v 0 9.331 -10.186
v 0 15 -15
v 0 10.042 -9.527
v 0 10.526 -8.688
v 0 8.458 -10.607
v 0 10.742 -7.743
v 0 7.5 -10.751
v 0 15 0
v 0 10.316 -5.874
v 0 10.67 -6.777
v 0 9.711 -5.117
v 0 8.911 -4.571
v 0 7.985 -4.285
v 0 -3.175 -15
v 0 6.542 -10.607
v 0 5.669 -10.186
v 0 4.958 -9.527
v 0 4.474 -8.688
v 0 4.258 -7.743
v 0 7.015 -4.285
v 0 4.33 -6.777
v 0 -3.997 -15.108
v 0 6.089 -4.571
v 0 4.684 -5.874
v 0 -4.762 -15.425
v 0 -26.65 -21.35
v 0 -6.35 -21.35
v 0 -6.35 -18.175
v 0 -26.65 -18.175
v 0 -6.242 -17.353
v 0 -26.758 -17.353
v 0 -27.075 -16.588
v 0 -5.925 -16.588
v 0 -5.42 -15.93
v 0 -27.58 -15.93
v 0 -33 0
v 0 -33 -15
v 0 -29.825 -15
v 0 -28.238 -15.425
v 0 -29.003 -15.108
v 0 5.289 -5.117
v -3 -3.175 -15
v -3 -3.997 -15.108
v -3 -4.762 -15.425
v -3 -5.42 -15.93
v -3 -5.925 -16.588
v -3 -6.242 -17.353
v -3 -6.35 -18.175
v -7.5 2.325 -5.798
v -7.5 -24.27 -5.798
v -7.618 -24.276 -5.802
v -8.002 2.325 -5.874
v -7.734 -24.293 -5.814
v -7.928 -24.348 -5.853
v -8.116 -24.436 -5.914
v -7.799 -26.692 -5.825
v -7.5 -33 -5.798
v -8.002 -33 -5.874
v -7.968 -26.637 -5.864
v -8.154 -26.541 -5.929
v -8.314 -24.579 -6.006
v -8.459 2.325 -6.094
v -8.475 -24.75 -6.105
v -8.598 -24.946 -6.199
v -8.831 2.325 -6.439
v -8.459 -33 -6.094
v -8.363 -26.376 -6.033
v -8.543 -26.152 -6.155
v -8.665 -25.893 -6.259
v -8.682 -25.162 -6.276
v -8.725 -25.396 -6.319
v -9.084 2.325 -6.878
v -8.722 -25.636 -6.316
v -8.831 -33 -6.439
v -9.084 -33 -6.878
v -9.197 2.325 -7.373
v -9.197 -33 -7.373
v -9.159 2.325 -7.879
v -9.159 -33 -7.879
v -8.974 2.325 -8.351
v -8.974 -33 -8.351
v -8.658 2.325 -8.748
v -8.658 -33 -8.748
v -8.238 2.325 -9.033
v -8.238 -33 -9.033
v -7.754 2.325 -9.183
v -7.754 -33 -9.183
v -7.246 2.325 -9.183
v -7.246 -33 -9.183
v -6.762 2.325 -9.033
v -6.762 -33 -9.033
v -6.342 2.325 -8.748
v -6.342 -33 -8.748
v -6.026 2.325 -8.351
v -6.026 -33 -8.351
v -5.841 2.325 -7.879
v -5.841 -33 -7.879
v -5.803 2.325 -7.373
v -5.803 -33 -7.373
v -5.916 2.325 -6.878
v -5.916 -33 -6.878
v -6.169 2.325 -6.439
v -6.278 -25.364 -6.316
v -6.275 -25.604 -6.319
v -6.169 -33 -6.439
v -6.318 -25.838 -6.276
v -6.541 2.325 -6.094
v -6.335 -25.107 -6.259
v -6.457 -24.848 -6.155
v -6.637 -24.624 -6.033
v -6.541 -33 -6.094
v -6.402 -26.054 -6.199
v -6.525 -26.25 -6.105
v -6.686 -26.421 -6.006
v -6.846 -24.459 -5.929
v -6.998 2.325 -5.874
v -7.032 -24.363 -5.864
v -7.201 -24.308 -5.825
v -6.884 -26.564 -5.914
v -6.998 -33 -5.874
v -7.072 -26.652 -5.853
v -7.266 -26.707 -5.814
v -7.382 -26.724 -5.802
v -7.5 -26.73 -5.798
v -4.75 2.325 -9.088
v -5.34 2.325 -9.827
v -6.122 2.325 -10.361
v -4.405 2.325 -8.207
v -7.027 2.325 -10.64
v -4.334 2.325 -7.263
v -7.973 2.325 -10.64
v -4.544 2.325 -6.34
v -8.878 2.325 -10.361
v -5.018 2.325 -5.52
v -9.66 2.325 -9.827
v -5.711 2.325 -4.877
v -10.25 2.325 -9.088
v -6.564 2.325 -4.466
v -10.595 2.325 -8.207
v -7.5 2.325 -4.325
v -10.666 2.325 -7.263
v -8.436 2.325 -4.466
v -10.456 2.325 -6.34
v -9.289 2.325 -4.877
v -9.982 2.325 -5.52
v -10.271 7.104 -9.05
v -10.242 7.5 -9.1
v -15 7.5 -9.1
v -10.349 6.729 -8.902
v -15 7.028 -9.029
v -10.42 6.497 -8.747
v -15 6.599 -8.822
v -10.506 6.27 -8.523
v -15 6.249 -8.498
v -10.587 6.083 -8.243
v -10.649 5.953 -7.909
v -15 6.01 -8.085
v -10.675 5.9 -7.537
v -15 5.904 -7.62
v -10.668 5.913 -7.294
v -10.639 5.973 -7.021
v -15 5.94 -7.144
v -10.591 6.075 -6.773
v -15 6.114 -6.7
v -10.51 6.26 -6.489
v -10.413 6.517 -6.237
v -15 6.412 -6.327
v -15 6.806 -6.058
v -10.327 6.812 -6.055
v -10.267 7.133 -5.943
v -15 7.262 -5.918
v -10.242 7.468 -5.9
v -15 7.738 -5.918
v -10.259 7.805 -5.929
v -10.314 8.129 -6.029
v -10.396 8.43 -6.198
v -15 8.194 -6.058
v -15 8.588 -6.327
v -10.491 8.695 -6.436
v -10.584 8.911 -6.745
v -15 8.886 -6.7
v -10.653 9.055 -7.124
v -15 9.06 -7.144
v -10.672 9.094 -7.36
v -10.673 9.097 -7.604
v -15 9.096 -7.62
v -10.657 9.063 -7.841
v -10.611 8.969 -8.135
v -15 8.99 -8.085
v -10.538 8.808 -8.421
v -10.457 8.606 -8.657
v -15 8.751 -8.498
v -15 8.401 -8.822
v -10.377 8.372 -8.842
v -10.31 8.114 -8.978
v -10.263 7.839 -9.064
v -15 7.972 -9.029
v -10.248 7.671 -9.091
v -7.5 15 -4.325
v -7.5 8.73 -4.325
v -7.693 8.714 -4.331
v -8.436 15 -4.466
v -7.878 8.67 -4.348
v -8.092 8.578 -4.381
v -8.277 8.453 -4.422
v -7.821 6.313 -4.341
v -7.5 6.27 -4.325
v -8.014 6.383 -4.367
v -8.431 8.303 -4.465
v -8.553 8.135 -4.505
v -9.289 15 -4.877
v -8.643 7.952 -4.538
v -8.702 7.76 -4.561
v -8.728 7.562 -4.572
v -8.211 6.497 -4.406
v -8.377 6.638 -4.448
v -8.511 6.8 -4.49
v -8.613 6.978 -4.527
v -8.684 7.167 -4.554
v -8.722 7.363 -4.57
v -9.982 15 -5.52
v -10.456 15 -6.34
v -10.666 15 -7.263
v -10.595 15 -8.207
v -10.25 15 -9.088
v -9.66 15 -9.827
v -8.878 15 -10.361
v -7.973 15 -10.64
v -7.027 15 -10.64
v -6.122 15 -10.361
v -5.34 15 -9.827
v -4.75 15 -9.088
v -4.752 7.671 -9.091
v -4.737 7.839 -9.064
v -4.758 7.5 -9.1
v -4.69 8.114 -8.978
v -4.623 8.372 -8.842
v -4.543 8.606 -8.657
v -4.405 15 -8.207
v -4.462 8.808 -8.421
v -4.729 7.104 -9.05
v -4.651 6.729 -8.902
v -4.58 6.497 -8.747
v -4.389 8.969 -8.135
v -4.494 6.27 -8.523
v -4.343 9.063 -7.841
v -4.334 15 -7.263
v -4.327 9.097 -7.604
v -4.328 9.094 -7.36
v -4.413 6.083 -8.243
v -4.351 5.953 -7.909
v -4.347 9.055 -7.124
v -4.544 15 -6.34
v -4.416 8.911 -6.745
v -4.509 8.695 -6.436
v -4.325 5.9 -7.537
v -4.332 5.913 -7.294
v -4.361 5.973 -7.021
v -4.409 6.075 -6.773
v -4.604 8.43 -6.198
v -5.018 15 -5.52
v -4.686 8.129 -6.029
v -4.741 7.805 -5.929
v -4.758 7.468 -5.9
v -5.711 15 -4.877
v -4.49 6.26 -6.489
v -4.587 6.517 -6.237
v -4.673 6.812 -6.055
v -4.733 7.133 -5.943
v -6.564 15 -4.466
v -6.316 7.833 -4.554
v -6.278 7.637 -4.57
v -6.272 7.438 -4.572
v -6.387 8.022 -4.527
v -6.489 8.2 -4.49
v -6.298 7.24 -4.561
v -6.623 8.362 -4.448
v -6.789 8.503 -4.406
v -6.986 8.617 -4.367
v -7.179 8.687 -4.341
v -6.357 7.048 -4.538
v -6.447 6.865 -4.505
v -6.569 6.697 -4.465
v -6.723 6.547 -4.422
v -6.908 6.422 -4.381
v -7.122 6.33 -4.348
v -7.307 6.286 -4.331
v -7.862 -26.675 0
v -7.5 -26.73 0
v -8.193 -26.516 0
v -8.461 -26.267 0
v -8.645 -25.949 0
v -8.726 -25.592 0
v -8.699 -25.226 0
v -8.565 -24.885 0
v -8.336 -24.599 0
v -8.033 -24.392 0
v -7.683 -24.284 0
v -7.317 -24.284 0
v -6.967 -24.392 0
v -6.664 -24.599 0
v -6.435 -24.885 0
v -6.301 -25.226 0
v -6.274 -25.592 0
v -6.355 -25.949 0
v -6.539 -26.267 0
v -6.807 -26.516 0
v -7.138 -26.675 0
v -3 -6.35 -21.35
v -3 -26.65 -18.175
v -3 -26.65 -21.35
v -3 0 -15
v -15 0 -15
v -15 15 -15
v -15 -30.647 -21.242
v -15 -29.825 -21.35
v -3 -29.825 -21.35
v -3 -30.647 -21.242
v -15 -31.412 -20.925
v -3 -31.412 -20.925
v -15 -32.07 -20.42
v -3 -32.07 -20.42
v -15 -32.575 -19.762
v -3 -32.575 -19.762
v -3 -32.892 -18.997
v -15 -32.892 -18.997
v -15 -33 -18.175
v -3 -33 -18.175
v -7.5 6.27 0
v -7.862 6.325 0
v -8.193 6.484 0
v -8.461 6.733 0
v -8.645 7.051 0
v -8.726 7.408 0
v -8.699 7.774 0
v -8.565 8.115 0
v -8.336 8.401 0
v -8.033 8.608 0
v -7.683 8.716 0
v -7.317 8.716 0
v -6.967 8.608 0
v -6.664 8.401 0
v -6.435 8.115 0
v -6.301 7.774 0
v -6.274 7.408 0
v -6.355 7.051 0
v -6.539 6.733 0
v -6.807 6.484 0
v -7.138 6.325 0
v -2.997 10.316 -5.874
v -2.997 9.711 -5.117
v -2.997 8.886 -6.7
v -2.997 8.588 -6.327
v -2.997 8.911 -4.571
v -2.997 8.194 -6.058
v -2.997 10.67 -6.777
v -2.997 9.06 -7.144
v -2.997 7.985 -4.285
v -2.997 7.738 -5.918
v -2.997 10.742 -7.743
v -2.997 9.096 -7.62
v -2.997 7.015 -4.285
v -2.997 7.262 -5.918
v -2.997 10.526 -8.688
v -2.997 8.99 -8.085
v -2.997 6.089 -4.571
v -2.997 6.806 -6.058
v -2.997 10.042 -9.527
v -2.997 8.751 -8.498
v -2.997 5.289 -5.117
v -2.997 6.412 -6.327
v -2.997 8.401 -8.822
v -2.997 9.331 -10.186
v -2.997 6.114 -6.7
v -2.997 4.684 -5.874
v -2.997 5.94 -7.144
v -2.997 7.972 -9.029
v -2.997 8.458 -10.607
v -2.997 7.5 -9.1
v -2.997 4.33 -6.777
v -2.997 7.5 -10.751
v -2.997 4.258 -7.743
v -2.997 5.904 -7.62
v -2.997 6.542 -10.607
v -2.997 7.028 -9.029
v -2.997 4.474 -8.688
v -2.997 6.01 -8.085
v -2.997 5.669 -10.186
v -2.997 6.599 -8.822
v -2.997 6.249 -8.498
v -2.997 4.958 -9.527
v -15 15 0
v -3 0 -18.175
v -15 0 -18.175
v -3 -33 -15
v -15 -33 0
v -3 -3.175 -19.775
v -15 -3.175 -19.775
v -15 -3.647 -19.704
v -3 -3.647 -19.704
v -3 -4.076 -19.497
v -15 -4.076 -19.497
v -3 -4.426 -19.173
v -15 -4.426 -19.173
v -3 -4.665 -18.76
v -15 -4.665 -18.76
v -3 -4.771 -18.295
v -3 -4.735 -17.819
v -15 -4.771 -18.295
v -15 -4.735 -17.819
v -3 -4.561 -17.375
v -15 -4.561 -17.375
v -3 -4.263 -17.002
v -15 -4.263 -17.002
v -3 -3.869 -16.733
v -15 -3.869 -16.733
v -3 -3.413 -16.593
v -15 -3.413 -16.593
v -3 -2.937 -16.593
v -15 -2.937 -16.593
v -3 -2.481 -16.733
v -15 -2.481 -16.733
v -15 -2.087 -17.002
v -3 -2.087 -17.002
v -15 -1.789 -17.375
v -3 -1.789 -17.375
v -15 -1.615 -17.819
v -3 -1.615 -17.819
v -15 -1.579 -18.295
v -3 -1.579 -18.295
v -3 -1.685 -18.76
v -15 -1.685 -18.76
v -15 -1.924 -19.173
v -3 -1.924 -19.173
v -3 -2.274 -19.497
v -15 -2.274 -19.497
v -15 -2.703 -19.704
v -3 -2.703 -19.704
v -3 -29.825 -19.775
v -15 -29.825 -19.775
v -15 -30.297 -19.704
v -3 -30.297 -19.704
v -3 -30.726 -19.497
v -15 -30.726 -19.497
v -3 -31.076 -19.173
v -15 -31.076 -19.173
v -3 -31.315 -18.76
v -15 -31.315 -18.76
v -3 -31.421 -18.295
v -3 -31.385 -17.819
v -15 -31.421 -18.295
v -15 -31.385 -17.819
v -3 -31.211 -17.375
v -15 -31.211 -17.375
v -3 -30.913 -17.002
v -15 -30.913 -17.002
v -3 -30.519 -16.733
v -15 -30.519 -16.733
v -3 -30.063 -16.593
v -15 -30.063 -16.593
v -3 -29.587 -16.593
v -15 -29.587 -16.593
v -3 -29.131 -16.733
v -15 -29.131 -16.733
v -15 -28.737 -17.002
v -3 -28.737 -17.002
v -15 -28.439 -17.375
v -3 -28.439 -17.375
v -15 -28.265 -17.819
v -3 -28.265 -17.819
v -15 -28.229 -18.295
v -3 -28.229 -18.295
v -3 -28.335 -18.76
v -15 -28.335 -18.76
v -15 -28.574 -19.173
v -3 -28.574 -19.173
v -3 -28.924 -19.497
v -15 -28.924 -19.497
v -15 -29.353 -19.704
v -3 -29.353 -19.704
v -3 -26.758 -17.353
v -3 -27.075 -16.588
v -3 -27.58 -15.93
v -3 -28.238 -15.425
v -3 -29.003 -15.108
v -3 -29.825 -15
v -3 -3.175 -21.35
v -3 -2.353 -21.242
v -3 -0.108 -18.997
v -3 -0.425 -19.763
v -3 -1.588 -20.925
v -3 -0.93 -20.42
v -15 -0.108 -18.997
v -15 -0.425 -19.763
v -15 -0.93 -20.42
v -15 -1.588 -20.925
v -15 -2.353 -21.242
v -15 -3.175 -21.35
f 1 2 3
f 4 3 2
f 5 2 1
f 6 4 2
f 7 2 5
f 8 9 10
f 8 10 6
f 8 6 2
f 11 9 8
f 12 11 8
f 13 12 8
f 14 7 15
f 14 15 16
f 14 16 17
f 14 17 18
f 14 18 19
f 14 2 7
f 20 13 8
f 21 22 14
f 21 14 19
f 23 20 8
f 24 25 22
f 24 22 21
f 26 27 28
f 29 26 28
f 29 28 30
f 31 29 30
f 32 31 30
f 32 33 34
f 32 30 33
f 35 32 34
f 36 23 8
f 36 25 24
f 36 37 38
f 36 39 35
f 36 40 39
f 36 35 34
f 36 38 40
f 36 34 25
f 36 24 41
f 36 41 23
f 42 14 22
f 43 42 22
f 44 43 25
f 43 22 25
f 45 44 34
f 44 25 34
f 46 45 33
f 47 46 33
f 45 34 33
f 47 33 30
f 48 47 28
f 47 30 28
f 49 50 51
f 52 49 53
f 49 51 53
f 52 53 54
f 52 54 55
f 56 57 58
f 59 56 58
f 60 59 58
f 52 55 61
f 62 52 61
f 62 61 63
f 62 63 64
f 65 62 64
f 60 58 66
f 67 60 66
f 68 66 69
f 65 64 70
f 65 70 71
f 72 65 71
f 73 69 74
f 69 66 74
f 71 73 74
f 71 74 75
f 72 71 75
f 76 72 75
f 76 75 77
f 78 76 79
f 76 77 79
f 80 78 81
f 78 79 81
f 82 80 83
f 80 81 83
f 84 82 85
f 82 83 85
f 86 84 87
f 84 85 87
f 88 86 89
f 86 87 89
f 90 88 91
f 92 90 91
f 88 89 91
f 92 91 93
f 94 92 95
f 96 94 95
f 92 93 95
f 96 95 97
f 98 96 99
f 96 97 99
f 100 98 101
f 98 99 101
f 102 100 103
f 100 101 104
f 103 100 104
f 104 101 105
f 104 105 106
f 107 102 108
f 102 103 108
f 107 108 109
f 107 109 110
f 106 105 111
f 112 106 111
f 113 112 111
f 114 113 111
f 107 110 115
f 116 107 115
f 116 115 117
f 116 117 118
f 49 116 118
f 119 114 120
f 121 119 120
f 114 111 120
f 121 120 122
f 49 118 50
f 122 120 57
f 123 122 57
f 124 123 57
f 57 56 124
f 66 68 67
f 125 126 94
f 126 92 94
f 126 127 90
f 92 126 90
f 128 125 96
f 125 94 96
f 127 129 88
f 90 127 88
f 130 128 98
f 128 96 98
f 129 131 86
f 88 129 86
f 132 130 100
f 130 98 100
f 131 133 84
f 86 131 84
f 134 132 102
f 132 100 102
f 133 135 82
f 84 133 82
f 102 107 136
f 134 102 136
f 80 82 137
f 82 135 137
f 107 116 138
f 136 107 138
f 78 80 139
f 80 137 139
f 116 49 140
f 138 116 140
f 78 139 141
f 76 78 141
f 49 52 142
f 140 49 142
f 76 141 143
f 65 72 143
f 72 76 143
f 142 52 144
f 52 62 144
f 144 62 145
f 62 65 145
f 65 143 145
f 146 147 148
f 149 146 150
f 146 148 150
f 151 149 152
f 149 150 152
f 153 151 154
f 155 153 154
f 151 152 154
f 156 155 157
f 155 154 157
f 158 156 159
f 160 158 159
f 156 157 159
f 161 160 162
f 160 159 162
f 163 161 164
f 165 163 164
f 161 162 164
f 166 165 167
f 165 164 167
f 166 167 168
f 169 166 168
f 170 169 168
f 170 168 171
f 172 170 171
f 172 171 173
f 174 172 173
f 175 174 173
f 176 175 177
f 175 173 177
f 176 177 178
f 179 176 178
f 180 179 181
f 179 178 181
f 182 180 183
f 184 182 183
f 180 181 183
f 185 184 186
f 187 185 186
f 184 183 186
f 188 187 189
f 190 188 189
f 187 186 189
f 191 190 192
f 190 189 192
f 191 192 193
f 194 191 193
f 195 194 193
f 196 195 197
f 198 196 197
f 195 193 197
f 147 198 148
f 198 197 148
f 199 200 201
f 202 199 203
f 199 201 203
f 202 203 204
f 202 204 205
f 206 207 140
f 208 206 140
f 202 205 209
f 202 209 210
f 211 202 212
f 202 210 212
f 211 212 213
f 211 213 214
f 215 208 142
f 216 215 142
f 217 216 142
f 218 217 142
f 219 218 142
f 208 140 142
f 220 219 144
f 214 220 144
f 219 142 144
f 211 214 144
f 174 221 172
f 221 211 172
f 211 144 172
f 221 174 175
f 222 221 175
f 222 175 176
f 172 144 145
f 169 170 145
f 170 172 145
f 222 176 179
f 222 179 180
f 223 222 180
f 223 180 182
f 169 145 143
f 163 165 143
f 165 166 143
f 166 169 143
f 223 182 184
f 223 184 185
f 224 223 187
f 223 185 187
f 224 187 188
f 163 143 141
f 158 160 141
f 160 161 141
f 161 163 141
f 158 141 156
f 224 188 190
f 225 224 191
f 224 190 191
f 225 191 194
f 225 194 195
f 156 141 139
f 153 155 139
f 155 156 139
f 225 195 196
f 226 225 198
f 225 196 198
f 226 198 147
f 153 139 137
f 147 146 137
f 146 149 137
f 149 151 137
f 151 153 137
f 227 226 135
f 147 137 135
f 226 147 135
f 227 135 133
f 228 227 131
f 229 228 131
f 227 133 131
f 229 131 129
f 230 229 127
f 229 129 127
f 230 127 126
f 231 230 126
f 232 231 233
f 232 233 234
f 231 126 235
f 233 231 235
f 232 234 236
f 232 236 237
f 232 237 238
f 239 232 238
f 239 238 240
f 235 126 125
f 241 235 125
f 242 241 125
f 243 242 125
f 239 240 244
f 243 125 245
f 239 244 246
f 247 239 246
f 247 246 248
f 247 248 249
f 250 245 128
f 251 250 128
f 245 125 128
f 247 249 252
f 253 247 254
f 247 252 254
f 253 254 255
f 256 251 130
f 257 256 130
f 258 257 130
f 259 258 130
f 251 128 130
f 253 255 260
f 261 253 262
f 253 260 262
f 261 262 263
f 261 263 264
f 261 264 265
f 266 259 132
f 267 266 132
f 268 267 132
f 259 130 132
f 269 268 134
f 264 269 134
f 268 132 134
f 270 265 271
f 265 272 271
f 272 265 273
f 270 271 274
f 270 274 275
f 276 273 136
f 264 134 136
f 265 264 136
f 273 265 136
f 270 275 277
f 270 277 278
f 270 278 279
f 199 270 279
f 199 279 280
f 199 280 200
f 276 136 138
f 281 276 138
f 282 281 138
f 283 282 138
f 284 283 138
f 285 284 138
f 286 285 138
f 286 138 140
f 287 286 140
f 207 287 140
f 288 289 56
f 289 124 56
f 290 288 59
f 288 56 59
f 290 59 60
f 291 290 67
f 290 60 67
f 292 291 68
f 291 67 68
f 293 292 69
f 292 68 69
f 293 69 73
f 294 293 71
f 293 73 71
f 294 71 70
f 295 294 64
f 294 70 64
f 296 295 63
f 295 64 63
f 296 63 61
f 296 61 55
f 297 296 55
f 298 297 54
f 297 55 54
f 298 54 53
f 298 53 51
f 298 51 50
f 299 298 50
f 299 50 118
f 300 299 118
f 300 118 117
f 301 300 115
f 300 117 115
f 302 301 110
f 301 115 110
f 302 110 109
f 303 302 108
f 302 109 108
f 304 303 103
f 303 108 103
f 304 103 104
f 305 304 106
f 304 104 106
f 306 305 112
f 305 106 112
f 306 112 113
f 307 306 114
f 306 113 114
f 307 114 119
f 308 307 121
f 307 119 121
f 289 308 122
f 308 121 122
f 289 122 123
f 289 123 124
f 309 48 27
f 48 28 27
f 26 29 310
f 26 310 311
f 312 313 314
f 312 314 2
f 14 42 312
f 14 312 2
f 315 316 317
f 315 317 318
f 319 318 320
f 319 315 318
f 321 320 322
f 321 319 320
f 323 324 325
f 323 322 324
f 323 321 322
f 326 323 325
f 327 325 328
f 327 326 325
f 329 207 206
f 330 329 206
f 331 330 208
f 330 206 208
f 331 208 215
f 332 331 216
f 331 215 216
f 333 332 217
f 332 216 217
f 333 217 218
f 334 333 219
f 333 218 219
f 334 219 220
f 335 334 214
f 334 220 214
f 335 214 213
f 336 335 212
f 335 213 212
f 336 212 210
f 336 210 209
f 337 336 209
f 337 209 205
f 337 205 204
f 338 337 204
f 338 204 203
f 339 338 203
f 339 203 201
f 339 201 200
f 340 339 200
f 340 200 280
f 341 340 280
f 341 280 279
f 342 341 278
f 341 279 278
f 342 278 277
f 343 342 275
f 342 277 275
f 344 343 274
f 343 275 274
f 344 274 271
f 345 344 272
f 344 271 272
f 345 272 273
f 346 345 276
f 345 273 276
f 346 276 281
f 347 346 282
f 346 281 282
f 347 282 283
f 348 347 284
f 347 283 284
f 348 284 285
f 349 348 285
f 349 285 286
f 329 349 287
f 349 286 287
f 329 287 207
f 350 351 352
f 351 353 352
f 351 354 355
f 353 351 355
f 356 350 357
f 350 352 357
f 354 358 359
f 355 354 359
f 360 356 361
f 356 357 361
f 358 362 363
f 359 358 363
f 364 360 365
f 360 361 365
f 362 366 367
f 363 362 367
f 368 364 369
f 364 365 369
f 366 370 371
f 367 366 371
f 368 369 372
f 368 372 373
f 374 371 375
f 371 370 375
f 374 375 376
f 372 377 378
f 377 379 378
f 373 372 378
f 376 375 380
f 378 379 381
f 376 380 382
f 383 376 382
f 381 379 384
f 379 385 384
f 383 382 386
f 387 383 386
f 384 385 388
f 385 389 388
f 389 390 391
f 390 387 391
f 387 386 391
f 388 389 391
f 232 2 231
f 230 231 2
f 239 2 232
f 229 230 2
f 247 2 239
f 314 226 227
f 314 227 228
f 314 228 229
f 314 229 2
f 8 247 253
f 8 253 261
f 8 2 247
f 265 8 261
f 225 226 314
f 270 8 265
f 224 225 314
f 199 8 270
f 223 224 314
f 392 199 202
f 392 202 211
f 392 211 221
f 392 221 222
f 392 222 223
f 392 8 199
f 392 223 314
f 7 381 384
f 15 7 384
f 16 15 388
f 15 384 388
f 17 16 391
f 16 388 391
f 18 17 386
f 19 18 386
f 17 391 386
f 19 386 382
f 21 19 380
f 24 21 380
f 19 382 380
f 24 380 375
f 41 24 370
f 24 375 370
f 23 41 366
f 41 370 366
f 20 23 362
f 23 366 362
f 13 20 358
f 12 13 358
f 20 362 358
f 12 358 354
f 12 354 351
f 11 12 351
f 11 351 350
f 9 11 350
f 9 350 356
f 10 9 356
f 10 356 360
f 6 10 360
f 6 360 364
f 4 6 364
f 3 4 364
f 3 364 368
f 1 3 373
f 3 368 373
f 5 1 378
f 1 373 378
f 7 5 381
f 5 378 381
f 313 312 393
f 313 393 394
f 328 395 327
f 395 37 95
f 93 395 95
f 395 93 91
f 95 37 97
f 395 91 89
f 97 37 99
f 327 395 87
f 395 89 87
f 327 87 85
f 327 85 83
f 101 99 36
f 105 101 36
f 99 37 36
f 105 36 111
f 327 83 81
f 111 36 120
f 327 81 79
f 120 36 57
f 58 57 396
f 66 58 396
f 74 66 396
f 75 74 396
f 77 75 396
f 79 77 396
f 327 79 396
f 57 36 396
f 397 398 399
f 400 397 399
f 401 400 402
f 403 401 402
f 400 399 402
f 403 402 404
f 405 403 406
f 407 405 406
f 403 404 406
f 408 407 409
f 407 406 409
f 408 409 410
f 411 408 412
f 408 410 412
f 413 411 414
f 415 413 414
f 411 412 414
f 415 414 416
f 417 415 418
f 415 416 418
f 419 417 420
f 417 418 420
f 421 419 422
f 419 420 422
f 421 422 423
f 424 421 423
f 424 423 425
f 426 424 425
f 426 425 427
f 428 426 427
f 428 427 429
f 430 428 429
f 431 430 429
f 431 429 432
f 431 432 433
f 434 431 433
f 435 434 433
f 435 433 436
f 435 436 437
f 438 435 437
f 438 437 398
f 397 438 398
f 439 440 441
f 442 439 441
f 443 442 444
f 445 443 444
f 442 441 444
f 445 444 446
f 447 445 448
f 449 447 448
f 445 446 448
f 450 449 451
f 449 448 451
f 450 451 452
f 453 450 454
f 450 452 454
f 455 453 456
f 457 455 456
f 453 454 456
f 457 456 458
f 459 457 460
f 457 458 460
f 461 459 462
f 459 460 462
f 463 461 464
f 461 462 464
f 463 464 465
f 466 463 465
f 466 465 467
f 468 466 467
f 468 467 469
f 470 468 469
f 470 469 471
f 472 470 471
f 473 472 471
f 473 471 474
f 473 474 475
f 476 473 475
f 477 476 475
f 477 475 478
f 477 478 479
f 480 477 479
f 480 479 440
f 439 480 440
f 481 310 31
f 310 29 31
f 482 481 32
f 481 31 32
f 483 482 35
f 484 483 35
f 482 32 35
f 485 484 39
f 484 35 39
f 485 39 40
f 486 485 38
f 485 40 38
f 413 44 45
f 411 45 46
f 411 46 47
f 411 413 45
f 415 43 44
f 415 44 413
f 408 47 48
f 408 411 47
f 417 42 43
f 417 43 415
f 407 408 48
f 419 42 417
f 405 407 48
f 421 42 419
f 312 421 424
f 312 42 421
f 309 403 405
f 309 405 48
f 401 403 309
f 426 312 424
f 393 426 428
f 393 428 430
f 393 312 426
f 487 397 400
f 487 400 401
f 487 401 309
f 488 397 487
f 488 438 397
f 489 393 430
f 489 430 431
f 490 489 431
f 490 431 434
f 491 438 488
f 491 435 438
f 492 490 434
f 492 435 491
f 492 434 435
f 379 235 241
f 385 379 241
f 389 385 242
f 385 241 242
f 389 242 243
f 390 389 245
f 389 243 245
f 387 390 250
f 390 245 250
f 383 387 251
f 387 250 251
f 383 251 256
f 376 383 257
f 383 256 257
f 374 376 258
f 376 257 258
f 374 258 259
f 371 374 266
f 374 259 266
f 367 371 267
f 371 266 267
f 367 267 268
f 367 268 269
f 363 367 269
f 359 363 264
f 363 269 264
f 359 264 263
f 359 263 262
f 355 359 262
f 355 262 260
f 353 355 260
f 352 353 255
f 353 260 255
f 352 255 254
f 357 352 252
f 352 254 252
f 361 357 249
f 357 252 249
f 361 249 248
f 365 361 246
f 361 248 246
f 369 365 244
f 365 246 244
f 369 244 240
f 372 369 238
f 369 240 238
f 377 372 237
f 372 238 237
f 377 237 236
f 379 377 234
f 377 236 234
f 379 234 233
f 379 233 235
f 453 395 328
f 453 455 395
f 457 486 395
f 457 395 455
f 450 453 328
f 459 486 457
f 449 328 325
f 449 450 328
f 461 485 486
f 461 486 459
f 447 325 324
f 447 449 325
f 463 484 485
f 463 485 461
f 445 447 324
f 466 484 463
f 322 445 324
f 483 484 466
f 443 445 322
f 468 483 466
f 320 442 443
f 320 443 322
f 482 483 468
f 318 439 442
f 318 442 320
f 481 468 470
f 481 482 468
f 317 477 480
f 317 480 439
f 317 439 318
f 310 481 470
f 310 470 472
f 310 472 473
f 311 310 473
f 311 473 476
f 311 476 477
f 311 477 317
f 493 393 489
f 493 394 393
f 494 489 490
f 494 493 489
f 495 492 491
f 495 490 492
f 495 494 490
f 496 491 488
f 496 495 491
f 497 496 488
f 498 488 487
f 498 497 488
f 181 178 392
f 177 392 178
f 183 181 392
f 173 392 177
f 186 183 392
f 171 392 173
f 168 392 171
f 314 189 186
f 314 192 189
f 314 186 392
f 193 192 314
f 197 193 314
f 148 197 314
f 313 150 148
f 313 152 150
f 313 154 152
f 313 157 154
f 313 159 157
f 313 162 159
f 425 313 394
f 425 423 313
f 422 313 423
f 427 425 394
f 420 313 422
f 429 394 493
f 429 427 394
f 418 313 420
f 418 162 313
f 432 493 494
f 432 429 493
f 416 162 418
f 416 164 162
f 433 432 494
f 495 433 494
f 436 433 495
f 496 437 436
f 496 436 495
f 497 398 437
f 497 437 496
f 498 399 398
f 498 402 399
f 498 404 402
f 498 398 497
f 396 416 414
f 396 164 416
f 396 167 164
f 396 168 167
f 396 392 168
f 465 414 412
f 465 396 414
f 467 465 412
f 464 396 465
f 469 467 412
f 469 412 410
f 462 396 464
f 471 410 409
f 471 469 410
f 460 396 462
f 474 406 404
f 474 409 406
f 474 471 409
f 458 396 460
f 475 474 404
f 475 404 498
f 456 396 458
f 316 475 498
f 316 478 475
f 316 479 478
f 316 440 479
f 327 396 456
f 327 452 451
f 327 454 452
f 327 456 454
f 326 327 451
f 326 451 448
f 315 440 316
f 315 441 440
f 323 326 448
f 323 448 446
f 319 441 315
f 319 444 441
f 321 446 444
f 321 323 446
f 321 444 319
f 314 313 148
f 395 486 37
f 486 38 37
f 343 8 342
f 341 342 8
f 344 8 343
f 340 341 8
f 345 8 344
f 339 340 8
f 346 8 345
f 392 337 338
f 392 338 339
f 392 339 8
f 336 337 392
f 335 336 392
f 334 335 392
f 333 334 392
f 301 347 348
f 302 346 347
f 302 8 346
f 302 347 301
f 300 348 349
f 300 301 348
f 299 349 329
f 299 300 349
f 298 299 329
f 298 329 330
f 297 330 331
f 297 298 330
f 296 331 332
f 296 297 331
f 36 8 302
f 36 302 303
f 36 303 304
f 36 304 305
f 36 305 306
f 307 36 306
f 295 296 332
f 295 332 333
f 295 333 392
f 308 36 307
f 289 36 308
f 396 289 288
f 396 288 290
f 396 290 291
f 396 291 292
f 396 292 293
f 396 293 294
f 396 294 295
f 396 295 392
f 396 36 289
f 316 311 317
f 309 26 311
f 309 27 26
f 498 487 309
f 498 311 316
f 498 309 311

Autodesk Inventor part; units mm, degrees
ref_plane "YZ Plane" through (0, 0, 0) normal (1, 0, 0) x (0, 1, 0)
ref_plane "XZ Plane" through (0, 0, 0) normal (0, 1, 0) x (-1, 0, 0)
ref_plane "XY Plane" through (0, 0, 0) normal (0, 0, 1) x (1, 0, 0)
sketch "Base Profile" plane through (0, 0, 0) normal (0, 1, 0) x (-1, 0, 0)
  line L0 (0, 0) -> (15, 0)
  line L1 (15, 0) -> (15, -15)
  line L2 (15, -15) -> (0, -15)
  line L3 (0, -15) -> (0, 0)
  line L4 (15, -15) -> (15, 0)
  line L5 (15, -15) -> (0, -15)
  line L6 (0, -15) -> (0, -21.35)
  line L7 (0, -21.35) -> (15, -21.35)
  line L8 (15, -21.35) -> (15, -15)
  dimension "d164" = 15
  dimension "d165" = 15
  dimension "d360" = 6.35
extrude "Stock" add sketch "Base Profile" against normal blind 33
extrude "Extrusion Post" add sketch "Base Profile" along normal blind 15 contours L0 L1 L2 L3
sketch "Front Pattern" plane through (0, -33, -21.35) normal (1, 0, 0) x (0, 0, -1)
  line L0 (-21.35, 0) -> (-21.35, 48) projected
  line L1 (0, 0) -> (-21.35, 0) projected
  line L2 (0, 33) -> (0, 0) projected
  line L3 (-6.35, 33) -> (0, 33) projected
  line L4 (-6.35, 33) -> (-6.35, 48) projected
  line L5 (-21.35, 48) -> (-6.35, 48) projected
  circle A0 centre (-13.85, 40.5) radius 3.175
  line L6 (-6.35, 33) -> (-6.35, 0)
  line L7 (-6.35, 16.5) -> (0, 16.5) construction
  circle A1 centre (-3.175, 29.825) radius 3.175
  circle A2 centre (-3.175, 3.175) radius 3.175
  line L8 (-3.175, 26.65) -> (0, 26.65)
  line L9 (-3.175, 6.35) -> (0, 6.35)
  line L10 (-6.35, 33) -> (0, 33) projected
  point P0 (-3.175, 16.5)
  point P1 (0, 3.175)
  point P2 (0, 29.825)
  point P3 (-6.35, 3.175)
  point P4 (-6.35, 29.825)
  point P5 (-3.175, 0)
  point P6 (-3.175, 33)
  dimension "d408" = 6.35
  dimension "d361" = 6.35
  dimension "d362" = 7.5
  dimension "d363" = 7.5
hole "Hole24" at (0, 7.5, -7.5) direction (-1, 0, 0) diameter 3.2004 end through all counterbore diameter 6.5024 counterbore depth 2.9972 clearance for "Socket Head Cap Screw" size "M3" standard "Ansi Metric M Profile"
hole "Hole23" at (0, -3.175, -18.175) at (0, -29.825, -18.175) direction (-1, 0, 0) diameter 3.2004 end through all counterbore diameter 6.35 counterbore depth 3 clearance for "Socket Head Cap Screw" size "M3" standard "Ansi Metric M Profile"
sketch "Sketch36" plane through (0, 15, 0) normal (0, 1, 0) x (1, 0, 0)
  line L0 (-15, 15) -> (-15, 0) projected
  line L1 (-15, 0) -> (0, 0) projected
  line L2 (0, 0) -> (0, 15) projected
  line L3 (0, 15) -> (-15, 15) projected
  circle A0 centre (-7.5, 7.5) radius 3.175
  dimension "d385" = 6.35
  dimension "d386" = 7.5
  dimension "d387" = 7.5
hole "Hole25" at (-7.5, 15, -7.5) direction (0, -1, 0) diameter 3.4036 end through all counterbore diameter 6.35 counterbore depth 12.675 clearance for "Socket Head Cap Screw" size "M3" standard "Ansi Metric M Profile"
sketch "Left Pattern" plane through (-15, -33, 0) normal (0, 0, 1) x (1, 0, 0)
  line L0 (0, 0) -> (0, 48) projected
  line L1 (15, 0) -> (0, 0) projected
  line L2 (15, 0) -> (15, 48) projected
  line L3 (0, 48) -> (15, 48) projected
  circle A0 centre (7.5, 40.5) radius 1.5
  circle A1 centre (7.5, 7.5) radius 1.5
  dimension "d395" = 3
  dimension "d396" = 7.5
  dimension "d397" = 7.5
  dimension "d398" = 3
  dimension "d399" = 7.5
hole "Hole26" at (-7.5, 7.5, 0) at (-7.5, -25.5, 0) direction (0, 0, -1) diameter 2.459 end up to surface thread size "M3x0.5" class "6H" standard "ANSI Metric M Profile"
extrude "Extrusion21" cut sketch "Front Pattern" against normal up to surface (3 mm away) contours L6 A2 L1 | A2 L2 L1 | A2 | L3 A1 L6 | A2 L9 L2 | A1 | L3 L2 A1 | A1 L2 L8
fillet "Fillet4" radius 3.175 2 edges at (-9, 0, -21.35) (-9, -33, -21.35)
equation "\"d164\" = extrusionWidth"
equation "\"d168\" = extrusionOffset"
equation "\"extrusionWidth\" = 15"
equation "\"idlerLength\" = 18"
equation "\"bearingOffsetFromBottom\" = 7.5"
equation "\"extrusionOffset\" = 33"
equation "\"bearingStackHeight\" = 9"
equation "\"bearingSlotLength\" = 5"
equation "\"bearingClearance\" = 13"
equation "\"pinSupportLength\" = 2"
properties part number "A Idler" material "Aluminum 6061"
